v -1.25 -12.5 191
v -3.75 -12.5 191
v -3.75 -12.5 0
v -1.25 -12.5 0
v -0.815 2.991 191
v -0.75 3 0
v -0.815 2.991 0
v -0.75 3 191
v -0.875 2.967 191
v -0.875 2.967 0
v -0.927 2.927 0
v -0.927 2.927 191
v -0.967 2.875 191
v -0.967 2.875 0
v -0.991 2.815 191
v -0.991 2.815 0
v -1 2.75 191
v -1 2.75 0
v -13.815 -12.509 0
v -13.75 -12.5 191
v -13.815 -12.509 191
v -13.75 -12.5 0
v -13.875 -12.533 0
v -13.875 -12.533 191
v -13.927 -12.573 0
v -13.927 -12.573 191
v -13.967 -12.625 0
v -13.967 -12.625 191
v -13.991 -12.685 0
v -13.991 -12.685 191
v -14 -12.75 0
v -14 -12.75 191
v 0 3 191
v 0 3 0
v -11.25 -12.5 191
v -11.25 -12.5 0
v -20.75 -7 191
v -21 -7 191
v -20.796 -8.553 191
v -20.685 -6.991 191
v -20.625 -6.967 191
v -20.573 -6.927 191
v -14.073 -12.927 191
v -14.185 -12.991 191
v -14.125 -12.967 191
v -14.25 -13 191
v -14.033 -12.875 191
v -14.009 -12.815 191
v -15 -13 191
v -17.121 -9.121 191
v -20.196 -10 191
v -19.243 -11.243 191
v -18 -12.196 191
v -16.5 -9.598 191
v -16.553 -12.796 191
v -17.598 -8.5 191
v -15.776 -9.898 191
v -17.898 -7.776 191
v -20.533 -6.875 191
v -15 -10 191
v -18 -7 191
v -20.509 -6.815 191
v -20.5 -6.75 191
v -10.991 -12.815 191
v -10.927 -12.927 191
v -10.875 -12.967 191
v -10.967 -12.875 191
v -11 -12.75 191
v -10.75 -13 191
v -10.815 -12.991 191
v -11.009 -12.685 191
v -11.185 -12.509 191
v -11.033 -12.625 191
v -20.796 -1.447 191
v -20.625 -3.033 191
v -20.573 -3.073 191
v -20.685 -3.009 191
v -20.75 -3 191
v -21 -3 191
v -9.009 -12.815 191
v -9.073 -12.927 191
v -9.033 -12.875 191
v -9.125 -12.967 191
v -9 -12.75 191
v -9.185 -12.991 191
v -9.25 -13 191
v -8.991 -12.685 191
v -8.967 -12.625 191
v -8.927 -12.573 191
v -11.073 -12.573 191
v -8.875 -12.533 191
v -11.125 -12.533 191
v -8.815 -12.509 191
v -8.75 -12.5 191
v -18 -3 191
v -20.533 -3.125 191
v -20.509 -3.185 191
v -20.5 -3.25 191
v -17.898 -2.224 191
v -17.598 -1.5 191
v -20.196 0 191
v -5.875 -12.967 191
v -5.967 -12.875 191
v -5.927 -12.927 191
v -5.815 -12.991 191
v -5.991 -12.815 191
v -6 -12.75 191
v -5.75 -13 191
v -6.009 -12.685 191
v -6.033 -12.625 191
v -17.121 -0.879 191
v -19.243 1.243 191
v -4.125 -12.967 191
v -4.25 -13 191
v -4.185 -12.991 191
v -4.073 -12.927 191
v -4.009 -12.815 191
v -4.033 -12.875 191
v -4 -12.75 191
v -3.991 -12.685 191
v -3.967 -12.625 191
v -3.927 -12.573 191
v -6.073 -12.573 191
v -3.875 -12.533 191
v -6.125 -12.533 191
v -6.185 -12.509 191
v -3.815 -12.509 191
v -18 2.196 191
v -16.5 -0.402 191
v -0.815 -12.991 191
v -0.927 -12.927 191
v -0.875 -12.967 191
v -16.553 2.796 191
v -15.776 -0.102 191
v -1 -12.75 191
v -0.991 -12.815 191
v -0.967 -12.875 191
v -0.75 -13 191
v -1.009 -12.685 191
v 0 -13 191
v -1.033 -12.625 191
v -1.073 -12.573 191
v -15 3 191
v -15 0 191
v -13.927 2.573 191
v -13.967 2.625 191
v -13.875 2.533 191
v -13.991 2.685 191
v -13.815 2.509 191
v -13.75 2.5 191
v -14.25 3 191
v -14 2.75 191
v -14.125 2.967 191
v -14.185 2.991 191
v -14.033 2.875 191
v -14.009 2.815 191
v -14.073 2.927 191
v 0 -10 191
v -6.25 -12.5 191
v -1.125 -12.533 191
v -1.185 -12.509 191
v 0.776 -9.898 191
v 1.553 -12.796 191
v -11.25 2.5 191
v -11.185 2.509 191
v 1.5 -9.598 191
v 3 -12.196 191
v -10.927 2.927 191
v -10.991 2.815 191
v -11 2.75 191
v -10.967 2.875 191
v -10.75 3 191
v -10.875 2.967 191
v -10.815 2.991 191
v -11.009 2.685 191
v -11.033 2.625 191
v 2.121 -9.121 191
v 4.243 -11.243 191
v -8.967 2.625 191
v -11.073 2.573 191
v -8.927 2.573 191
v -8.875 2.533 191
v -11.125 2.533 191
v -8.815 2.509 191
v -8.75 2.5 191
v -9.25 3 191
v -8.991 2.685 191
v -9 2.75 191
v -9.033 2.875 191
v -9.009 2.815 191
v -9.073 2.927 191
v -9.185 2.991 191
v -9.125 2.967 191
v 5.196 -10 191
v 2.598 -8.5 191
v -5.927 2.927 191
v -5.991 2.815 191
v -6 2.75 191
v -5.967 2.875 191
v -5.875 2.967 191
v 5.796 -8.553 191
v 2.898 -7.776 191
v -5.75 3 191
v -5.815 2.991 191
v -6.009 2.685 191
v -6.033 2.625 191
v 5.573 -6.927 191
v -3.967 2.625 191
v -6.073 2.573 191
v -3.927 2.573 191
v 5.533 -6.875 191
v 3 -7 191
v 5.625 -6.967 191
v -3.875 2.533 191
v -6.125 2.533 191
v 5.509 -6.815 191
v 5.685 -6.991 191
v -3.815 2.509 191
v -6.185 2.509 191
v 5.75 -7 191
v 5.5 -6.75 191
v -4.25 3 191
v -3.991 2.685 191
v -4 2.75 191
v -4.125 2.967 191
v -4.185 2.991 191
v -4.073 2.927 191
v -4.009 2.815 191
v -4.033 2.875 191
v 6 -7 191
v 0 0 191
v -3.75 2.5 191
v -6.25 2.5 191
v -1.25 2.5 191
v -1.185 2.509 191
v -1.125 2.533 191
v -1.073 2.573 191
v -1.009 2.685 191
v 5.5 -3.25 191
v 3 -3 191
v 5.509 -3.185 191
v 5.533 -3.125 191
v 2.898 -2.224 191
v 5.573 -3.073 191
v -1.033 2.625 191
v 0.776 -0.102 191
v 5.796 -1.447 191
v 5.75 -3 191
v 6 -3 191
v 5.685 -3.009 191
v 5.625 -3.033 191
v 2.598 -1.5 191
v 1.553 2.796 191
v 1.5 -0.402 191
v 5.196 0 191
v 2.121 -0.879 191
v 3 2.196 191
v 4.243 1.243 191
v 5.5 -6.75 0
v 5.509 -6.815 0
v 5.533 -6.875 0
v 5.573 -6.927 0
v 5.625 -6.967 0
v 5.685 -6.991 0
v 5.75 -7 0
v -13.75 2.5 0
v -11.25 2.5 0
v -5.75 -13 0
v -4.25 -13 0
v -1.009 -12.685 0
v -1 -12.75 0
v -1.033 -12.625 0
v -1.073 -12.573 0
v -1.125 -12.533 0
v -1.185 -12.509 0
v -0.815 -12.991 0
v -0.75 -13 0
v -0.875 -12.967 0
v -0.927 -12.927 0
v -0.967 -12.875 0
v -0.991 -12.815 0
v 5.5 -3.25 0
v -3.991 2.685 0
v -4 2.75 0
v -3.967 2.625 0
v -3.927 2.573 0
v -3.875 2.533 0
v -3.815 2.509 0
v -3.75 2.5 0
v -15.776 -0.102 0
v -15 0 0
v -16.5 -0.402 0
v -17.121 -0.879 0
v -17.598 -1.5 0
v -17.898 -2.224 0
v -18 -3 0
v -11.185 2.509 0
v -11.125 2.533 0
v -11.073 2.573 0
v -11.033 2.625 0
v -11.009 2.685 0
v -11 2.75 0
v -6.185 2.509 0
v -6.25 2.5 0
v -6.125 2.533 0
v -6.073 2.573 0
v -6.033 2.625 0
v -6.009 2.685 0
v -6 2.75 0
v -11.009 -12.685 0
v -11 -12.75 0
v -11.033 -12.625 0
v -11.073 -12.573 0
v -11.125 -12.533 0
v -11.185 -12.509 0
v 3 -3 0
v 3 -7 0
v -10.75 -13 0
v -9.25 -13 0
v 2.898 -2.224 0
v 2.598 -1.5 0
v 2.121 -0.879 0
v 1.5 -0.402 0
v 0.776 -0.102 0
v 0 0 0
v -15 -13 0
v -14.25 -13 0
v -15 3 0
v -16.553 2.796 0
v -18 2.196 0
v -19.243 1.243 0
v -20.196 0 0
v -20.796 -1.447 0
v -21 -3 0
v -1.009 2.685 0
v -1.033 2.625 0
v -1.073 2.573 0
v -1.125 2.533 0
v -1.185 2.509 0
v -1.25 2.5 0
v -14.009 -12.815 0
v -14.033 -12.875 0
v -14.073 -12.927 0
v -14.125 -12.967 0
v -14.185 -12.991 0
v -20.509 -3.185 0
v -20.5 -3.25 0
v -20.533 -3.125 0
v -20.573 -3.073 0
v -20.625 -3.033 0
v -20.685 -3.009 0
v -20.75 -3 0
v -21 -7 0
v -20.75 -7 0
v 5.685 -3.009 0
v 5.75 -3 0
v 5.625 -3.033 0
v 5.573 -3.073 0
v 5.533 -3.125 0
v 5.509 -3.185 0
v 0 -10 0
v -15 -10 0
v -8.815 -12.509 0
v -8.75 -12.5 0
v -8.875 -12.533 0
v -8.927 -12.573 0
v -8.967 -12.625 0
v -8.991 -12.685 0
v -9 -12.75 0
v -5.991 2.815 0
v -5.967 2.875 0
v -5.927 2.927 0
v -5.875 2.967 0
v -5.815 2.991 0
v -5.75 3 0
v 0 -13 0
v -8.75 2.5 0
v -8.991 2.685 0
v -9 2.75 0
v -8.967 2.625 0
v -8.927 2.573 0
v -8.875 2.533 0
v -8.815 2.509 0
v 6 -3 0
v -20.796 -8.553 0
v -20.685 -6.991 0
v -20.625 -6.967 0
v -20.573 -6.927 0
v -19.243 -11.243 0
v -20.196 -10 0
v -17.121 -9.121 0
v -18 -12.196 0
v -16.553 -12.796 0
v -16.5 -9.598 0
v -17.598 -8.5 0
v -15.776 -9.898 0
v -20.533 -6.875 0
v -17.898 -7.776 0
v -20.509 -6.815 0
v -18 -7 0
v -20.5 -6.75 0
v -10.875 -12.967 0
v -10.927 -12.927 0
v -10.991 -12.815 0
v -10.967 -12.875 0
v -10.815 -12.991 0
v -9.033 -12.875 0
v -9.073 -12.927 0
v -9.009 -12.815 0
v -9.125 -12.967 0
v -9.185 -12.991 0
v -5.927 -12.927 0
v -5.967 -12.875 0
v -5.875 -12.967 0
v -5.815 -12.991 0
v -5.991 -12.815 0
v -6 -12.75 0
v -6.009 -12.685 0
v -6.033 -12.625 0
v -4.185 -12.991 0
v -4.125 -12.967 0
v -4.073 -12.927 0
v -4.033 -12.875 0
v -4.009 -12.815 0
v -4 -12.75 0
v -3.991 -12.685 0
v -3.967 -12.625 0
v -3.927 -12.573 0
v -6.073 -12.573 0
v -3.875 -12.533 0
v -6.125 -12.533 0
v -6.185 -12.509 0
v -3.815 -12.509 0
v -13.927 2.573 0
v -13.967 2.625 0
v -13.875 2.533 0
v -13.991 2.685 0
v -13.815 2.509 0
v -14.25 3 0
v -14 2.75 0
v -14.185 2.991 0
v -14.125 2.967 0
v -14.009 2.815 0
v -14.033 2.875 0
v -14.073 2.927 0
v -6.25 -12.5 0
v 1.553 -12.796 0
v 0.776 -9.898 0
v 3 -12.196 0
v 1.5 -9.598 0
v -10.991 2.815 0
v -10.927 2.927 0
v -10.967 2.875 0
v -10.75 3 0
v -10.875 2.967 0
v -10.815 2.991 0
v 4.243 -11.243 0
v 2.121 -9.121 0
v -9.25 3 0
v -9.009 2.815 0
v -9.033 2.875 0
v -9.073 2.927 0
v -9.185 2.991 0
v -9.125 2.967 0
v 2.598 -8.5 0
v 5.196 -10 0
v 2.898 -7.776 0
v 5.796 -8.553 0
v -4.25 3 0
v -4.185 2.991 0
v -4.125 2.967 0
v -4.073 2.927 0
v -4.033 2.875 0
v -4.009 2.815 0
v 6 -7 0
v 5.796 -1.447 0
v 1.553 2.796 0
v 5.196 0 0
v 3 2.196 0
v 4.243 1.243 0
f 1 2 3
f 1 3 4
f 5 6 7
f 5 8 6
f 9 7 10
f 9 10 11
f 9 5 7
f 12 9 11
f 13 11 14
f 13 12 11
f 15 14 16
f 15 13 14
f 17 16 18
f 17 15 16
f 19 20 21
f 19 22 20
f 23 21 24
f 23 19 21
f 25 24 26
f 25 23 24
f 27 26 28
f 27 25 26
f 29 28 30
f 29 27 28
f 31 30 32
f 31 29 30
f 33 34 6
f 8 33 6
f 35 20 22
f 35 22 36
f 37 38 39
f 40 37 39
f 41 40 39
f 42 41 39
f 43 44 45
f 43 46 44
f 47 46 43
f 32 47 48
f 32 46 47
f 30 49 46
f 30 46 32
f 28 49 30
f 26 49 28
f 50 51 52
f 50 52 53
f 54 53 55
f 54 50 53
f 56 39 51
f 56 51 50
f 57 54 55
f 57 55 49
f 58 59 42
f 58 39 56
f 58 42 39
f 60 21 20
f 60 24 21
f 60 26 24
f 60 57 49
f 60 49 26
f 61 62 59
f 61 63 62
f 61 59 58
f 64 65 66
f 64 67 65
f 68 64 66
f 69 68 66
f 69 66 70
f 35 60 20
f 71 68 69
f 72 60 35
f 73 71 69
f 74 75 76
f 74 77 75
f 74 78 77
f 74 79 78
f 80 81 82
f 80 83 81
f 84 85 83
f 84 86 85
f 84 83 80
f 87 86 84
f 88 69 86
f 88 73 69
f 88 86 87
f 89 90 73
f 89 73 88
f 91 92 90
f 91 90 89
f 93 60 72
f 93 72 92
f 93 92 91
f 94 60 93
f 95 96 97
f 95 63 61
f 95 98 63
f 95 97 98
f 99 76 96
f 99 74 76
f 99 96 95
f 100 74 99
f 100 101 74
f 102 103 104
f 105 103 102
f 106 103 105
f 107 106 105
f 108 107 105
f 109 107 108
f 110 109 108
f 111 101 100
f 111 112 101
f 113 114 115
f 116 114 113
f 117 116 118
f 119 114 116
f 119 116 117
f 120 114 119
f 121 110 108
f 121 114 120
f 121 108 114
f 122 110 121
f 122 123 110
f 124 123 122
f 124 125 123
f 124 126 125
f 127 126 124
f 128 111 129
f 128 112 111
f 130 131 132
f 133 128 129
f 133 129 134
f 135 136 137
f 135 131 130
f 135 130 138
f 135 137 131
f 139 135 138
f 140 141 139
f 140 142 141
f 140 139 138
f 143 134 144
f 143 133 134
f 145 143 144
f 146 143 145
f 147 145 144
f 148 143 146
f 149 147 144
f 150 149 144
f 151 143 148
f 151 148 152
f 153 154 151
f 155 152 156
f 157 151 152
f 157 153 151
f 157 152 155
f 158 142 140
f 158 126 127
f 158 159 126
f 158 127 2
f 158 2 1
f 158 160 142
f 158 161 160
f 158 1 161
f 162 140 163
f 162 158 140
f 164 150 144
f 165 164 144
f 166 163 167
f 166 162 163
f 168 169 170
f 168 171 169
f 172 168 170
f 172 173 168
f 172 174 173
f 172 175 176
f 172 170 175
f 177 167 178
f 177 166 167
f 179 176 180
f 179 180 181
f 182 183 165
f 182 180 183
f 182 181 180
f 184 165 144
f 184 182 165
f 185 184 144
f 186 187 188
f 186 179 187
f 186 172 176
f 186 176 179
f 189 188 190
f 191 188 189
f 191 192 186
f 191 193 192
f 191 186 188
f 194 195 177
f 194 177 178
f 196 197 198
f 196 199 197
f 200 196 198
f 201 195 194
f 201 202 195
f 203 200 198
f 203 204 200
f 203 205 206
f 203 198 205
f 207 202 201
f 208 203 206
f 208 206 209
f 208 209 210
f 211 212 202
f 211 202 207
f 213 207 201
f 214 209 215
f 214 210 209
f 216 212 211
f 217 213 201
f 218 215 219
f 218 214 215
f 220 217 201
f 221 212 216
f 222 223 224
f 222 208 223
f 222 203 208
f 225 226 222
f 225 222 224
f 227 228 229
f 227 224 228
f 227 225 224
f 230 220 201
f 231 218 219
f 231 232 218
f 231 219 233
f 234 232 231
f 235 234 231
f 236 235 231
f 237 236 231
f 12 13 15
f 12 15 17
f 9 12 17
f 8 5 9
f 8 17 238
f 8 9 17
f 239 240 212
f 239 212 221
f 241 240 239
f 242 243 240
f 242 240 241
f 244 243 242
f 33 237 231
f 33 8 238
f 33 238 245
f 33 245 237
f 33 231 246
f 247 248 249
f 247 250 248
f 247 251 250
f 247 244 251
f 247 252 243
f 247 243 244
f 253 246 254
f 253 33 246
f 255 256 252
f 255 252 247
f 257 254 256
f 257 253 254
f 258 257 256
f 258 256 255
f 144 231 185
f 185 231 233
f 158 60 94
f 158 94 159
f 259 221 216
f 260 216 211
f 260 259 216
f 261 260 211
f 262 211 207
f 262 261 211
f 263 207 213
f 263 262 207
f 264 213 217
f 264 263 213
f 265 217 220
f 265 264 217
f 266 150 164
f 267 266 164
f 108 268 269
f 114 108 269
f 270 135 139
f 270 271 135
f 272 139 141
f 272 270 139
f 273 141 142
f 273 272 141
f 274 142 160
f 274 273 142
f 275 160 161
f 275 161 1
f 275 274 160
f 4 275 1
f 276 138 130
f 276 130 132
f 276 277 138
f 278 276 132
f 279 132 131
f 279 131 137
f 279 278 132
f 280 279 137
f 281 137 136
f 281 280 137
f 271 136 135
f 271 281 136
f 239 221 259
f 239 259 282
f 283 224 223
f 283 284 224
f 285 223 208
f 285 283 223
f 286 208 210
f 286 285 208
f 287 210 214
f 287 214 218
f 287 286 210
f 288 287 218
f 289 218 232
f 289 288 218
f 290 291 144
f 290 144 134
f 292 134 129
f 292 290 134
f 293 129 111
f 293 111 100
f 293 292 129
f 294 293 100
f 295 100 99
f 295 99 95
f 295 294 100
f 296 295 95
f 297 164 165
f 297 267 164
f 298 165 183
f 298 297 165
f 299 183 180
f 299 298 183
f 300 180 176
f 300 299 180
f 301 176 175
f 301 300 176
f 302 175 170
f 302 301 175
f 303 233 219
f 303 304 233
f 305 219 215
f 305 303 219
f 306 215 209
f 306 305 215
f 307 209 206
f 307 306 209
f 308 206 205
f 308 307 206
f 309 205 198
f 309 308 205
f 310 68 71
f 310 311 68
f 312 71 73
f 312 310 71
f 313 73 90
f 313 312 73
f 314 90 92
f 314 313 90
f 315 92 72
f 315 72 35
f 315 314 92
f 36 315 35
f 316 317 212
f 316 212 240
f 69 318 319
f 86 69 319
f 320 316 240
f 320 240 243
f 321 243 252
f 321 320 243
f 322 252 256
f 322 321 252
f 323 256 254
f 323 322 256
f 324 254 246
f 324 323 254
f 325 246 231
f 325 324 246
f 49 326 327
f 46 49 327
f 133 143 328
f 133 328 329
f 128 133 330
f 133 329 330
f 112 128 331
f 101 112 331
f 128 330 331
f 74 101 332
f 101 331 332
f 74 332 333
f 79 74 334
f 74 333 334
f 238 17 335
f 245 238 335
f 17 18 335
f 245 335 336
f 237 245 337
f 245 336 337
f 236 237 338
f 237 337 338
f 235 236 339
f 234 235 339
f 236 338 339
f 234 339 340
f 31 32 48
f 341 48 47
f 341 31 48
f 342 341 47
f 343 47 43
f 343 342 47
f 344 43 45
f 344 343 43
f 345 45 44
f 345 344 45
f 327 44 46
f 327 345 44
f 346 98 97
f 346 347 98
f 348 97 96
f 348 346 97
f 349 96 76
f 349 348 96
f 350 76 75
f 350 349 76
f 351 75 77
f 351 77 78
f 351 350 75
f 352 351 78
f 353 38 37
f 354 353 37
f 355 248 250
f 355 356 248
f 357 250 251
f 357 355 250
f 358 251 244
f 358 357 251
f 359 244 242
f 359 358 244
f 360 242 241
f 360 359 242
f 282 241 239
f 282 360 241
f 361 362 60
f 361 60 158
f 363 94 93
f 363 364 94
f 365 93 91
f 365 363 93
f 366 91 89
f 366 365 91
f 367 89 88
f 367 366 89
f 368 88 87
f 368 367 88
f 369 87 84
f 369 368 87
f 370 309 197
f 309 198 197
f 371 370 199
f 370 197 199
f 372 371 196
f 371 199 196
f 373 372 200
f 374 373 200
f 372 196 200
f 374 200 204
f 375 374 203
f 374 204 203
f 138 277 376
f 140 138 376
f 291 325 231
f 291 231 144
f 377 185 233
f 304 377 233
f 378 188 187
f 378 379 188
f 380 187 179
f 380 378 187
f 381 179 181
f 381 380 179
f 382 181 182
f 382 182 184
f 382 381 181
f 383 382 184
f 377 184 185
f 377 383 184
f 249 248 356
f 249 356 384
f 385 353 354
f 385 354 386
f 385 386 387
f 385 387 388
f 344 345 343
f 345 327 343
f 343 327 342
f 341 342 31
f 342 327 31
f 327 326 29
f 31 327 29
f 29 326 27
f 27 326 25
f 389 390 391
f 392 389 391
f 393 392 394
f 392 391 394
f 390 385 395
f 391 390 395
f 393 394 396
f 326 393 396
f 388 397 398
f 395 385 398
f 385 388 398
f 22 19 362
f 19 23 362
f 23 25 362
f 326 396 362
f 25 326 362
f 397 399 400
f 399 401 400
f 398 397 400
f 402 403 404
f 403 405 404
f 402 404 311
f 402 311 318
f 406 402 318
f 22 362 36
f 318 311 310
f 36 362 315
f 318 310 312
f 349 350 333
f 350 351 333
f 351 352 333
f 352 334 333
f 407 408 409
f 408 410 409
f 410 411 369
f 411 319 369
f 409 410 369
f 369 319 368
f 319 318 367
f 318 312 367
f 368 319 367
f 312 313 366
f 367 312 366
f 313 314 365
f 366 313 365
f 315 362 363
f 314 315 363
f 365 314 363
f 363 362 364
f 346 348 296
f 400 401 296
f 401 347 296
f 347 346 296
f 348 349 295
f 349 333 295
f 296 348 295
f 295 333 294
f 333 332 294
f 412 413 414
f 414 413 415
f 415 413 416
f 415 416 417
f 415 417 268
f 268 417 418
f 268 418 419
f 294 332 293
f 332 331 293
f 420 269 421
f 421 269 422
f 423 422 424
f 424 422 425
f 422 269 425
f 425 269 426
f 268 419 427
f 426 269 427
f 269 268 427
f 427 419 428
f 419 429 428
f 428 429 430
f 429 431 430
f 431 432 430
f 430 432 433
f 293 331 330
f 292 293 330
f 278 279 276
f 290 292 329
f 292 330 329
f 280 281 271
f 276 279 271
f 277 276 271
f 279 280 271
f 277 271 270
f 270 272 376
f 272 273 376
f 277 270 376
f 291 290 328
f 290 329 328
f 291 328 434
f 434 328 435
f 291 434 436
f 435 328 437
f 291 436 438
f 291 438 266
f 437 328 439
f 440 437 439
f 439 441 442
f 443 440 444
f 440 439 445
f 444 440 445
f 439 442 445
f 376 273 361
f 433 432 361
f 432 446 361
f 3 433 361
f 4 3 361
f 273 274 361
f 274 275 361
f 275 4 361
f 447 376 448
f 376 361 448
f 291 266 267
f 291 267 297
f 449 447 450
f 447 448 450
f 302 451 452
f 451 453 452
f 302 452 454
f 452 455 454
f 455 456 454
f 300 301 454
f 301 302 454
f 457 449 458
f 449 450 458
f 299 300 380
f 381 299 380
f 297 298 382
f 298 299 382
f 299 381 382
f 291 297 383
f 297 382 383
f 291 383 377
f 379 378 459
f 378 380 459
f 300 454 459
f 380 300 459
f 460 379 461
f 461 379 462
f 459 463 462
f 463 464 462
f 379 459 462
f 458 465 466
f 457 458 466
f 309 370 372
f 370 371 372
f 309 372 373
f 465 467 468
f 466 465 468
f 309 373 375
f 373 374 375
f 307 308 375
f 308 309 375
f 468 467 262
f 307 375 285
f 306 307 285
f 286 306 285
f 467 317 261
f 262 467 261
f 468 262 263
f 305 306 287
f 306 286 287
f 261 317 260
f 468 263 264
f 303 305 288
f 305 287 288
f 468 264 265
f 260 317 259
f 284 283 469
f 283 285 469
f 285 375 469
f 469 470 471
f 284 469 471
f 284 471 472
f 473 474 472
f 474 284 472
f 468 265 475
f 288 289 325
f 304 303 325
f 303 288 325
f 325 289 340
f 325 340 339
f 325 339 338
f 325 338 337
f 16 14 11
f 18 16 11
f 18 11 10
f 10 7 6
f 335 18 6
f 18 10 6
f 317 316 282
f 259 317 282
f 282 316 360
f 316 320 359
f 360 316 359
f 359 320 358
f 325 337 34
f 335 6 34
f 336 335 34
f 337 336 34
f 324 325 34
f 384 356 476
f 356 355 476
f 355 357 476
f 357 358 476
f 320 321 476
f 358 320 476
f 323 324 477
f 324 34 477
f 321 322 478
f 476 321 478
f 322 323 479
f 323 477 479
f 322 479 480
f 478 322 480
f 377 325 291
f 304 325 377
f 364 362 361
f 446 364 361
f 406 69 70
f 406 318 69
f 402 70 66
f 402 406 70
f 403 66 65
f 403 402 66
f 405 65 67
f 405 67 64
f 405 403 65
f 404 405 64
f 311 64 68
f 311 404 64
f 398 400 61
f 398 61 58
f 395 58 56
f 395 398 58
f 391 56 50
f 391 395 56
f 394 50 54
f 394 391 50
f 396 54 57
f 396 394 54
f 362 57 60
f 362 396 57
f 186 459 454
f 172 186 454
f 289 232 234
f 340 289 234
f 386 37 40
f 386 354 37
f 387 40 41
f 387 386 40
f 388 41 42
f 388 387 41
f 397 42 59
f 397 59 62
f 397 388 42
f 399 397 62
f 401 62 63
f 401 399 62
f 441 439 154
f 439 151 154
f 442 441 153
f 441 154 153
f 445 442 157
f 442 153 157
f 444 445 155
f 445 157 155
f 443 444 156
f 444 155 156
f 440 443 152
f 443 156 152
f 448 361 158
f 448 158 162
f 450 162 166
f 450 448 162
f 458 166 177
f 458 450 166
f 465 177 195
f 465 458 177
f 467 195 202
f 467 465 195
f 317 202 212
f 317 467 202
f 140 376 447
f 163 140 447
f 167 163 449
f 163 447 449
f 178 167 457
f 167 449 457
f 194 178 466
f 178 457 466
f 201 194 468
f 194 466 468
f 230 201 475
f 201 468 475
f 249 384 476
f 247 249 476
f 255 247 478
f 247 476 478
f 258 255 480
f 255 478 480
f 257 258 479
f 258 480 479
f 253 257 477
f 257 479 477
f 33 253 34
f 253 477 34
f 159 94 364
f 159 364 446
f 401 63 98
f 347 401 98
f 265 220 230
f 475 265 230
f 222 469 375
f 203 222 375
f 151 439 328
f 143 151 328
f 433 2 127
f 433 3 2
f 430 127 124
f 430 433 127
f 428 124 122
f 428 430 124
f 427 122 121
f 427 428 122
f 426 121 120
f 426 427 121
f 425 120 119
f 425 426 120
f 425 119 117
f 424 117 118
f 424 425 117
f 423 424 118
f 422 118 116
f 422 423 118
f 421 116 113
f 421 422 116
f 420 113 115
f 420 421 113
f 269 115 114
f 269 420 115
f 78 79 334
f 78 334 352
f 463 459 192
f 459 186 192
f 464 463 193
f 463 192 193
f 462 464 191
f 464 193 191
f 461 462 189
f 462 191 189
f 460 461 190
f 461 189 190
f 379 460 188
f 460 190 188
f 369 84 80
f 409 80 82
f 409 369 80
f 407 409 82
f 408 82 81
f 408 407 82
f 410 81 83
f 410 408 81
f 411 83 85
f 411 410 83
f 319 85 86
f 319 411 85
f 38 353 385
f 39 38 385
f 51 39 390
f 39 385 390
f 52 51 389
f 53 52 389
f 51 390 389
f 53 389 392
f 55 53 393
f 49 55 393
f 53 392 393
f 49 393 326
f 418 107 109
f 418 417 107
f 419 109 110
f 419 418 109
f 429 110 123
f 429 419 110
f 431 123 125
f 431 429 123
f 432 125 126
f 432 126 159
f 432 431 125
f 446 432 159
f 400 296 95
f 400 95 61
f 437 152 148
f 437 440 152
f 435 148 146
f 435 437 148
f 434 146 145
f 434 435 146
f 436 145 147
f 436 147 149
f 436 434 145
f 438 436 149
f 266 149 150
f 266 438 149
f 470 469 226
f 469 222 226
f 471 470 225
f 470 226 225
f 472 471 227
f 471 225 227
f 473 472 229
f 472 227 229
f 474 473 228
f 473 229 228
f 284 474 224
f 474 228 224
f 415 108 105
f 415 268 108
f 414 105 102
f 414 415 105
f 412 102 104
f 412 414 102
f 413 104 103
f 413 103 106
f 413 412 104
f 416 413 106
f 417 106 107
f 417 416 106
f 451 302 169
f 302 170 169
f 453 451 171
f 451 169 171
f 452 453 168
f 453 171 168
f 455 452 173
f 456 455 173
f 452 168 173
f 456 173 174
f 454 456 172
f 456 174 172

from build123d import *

# Parameters (mm, degrees)
BOSS_EXTRUDE1_DEPTH = 191
SKETCH2_W           = 3
SKETCH2_H           = 1
SKETCH2_W_2         = 1
SKETCH2_H_2         = 4
CUT_EXTRUDE1_DEPTH  = 193.59023859
FILLET1_R           = 0.25


with BuildPart() as part:
    # Sketch1 → Boss-Extrude1 (new body)
    with BuildSketch(Plane.XY):
        with BuildLine():
            Line((0, 3), (-15, 3))
            ThreePointArc((-15, 3), (-19.242640687, 1.242640687), (-21, -3))
            Line((-21, -3), (-21, -7))
            ThreePointArc((-21, -7), (-19.242640687, -11.242640687), (-15, -13))
            Line((-15, -13), (0, -13))
            ThreePointArc((0, -13), (4.242640687, -11.242640687), (6, -7))
            Line((6, -7), (6, -3))
            ThreePointArc((6, -3), (4.242640687, 1.242640687), (0, 3))
        make_face()
        with BuildLine():
            Line((0, 0), (-15, 0))
            ThreePointArc((-15, 0), (-17.121320344, -0.878679656), (-18, -3))
            Line((-18, -3), (-18, -7))
            ThreePointArc((-18, -7), (-17.121320344, -9.121320344), (-15, -10))
            Line((-15, -10), (0, -10))
            ThreePointArc((0, -10), (2.121320344, -9.121320344), (3, -7))
            Line((3, -7), (3, -3))
            ThreePointArc((3, -3), (2.121320344, -0.878679656), (0, 0))
        make_face(mode=Mode.SUBTRACT)
    extrude(amount=BOSS_EXTRUDE1_DEPTH)

    # Sketch2 → Cut-Extrude1 (cut, through all)
    with BuildSketch(Plane.XY.offset(191)):
        with Locations((-7.5, 3)):
            Rectangle(SKETCH2_W, SKETCH2_H)
        with Locations((-12.5, 3)):
            Rectangle(SKETCH2_W, SKETCH2_H)
        with Locations((-2.5, 3)):
            Rectangle(SKETCH2_W, SKETCH2_H)
        with Locations((-2.5, -13)):
            Rectangle(SKETCH2_W, SKETCH2_H)
        with Locations((-12.5, -13)):
            Rectangle(SKETCH2_W, SKETCH2_H)
        with Locations((-7.5, -13)):
            Rectangle(SKETCH2_W, SKETCH2_H)
        with Locations((6, -5)):
            Rectangle(SKETCH2_W_2, SKETCH2_H_2)
        with Locations((-21, -5)):
            Rectangle(SKETCH2_W_2, SKETCH2_H_2)
    extrude(amount=-CUT_EXTRUDE1_DEPTH, mode=Mode.SUBTRACT)

    # Fillet1
    fillet1_edges = [part.edges().sort_by_distance(p)[0] for p in [
        (-20.5, -7, 95.5),
        (-20.5, -3, 95.5),
        (-14, -13, 95.5),
        (-11, -12.5, 95.5),
        (-6, -12.5, 95.5),
        (-11, -13, 95.5),
        (-9, -13, 95.5),
        (-6, -13, 95.5),
        (-4, -13, 95.5),
        (-14, -12.5, 95.5),
        (-9, -12.5, 95.5),
        (-1, -13, 95.5),
        (-1, -12.5, 95.5),
        (5.5, -7, 95.5),
        (-4, -12.5, 95.5),
        (5.5, -3, 95.5),
        (-1, 3, 95.5),
        (-4, 3, 95.5),
        (-6, 3, 95.5),
        (-14, 3, 95.5),
        (-11, 3, 95.5),
        (-9, 3, 95.5),
        (-1, 2.5, 95.5),
        (-4, 2.5, 95.5),
        (-6, 2.5, 95.5),
        (-9, 2.5, 95.5),
        (-11, 2.5, 95.5),
        (-14, 2.5, 95.5),
    ]]
    fillet(fillet1_edges, radius=FILLET1_R - 0.0001)  # a hair under: the kernel refuses the full size


solid = part.part
